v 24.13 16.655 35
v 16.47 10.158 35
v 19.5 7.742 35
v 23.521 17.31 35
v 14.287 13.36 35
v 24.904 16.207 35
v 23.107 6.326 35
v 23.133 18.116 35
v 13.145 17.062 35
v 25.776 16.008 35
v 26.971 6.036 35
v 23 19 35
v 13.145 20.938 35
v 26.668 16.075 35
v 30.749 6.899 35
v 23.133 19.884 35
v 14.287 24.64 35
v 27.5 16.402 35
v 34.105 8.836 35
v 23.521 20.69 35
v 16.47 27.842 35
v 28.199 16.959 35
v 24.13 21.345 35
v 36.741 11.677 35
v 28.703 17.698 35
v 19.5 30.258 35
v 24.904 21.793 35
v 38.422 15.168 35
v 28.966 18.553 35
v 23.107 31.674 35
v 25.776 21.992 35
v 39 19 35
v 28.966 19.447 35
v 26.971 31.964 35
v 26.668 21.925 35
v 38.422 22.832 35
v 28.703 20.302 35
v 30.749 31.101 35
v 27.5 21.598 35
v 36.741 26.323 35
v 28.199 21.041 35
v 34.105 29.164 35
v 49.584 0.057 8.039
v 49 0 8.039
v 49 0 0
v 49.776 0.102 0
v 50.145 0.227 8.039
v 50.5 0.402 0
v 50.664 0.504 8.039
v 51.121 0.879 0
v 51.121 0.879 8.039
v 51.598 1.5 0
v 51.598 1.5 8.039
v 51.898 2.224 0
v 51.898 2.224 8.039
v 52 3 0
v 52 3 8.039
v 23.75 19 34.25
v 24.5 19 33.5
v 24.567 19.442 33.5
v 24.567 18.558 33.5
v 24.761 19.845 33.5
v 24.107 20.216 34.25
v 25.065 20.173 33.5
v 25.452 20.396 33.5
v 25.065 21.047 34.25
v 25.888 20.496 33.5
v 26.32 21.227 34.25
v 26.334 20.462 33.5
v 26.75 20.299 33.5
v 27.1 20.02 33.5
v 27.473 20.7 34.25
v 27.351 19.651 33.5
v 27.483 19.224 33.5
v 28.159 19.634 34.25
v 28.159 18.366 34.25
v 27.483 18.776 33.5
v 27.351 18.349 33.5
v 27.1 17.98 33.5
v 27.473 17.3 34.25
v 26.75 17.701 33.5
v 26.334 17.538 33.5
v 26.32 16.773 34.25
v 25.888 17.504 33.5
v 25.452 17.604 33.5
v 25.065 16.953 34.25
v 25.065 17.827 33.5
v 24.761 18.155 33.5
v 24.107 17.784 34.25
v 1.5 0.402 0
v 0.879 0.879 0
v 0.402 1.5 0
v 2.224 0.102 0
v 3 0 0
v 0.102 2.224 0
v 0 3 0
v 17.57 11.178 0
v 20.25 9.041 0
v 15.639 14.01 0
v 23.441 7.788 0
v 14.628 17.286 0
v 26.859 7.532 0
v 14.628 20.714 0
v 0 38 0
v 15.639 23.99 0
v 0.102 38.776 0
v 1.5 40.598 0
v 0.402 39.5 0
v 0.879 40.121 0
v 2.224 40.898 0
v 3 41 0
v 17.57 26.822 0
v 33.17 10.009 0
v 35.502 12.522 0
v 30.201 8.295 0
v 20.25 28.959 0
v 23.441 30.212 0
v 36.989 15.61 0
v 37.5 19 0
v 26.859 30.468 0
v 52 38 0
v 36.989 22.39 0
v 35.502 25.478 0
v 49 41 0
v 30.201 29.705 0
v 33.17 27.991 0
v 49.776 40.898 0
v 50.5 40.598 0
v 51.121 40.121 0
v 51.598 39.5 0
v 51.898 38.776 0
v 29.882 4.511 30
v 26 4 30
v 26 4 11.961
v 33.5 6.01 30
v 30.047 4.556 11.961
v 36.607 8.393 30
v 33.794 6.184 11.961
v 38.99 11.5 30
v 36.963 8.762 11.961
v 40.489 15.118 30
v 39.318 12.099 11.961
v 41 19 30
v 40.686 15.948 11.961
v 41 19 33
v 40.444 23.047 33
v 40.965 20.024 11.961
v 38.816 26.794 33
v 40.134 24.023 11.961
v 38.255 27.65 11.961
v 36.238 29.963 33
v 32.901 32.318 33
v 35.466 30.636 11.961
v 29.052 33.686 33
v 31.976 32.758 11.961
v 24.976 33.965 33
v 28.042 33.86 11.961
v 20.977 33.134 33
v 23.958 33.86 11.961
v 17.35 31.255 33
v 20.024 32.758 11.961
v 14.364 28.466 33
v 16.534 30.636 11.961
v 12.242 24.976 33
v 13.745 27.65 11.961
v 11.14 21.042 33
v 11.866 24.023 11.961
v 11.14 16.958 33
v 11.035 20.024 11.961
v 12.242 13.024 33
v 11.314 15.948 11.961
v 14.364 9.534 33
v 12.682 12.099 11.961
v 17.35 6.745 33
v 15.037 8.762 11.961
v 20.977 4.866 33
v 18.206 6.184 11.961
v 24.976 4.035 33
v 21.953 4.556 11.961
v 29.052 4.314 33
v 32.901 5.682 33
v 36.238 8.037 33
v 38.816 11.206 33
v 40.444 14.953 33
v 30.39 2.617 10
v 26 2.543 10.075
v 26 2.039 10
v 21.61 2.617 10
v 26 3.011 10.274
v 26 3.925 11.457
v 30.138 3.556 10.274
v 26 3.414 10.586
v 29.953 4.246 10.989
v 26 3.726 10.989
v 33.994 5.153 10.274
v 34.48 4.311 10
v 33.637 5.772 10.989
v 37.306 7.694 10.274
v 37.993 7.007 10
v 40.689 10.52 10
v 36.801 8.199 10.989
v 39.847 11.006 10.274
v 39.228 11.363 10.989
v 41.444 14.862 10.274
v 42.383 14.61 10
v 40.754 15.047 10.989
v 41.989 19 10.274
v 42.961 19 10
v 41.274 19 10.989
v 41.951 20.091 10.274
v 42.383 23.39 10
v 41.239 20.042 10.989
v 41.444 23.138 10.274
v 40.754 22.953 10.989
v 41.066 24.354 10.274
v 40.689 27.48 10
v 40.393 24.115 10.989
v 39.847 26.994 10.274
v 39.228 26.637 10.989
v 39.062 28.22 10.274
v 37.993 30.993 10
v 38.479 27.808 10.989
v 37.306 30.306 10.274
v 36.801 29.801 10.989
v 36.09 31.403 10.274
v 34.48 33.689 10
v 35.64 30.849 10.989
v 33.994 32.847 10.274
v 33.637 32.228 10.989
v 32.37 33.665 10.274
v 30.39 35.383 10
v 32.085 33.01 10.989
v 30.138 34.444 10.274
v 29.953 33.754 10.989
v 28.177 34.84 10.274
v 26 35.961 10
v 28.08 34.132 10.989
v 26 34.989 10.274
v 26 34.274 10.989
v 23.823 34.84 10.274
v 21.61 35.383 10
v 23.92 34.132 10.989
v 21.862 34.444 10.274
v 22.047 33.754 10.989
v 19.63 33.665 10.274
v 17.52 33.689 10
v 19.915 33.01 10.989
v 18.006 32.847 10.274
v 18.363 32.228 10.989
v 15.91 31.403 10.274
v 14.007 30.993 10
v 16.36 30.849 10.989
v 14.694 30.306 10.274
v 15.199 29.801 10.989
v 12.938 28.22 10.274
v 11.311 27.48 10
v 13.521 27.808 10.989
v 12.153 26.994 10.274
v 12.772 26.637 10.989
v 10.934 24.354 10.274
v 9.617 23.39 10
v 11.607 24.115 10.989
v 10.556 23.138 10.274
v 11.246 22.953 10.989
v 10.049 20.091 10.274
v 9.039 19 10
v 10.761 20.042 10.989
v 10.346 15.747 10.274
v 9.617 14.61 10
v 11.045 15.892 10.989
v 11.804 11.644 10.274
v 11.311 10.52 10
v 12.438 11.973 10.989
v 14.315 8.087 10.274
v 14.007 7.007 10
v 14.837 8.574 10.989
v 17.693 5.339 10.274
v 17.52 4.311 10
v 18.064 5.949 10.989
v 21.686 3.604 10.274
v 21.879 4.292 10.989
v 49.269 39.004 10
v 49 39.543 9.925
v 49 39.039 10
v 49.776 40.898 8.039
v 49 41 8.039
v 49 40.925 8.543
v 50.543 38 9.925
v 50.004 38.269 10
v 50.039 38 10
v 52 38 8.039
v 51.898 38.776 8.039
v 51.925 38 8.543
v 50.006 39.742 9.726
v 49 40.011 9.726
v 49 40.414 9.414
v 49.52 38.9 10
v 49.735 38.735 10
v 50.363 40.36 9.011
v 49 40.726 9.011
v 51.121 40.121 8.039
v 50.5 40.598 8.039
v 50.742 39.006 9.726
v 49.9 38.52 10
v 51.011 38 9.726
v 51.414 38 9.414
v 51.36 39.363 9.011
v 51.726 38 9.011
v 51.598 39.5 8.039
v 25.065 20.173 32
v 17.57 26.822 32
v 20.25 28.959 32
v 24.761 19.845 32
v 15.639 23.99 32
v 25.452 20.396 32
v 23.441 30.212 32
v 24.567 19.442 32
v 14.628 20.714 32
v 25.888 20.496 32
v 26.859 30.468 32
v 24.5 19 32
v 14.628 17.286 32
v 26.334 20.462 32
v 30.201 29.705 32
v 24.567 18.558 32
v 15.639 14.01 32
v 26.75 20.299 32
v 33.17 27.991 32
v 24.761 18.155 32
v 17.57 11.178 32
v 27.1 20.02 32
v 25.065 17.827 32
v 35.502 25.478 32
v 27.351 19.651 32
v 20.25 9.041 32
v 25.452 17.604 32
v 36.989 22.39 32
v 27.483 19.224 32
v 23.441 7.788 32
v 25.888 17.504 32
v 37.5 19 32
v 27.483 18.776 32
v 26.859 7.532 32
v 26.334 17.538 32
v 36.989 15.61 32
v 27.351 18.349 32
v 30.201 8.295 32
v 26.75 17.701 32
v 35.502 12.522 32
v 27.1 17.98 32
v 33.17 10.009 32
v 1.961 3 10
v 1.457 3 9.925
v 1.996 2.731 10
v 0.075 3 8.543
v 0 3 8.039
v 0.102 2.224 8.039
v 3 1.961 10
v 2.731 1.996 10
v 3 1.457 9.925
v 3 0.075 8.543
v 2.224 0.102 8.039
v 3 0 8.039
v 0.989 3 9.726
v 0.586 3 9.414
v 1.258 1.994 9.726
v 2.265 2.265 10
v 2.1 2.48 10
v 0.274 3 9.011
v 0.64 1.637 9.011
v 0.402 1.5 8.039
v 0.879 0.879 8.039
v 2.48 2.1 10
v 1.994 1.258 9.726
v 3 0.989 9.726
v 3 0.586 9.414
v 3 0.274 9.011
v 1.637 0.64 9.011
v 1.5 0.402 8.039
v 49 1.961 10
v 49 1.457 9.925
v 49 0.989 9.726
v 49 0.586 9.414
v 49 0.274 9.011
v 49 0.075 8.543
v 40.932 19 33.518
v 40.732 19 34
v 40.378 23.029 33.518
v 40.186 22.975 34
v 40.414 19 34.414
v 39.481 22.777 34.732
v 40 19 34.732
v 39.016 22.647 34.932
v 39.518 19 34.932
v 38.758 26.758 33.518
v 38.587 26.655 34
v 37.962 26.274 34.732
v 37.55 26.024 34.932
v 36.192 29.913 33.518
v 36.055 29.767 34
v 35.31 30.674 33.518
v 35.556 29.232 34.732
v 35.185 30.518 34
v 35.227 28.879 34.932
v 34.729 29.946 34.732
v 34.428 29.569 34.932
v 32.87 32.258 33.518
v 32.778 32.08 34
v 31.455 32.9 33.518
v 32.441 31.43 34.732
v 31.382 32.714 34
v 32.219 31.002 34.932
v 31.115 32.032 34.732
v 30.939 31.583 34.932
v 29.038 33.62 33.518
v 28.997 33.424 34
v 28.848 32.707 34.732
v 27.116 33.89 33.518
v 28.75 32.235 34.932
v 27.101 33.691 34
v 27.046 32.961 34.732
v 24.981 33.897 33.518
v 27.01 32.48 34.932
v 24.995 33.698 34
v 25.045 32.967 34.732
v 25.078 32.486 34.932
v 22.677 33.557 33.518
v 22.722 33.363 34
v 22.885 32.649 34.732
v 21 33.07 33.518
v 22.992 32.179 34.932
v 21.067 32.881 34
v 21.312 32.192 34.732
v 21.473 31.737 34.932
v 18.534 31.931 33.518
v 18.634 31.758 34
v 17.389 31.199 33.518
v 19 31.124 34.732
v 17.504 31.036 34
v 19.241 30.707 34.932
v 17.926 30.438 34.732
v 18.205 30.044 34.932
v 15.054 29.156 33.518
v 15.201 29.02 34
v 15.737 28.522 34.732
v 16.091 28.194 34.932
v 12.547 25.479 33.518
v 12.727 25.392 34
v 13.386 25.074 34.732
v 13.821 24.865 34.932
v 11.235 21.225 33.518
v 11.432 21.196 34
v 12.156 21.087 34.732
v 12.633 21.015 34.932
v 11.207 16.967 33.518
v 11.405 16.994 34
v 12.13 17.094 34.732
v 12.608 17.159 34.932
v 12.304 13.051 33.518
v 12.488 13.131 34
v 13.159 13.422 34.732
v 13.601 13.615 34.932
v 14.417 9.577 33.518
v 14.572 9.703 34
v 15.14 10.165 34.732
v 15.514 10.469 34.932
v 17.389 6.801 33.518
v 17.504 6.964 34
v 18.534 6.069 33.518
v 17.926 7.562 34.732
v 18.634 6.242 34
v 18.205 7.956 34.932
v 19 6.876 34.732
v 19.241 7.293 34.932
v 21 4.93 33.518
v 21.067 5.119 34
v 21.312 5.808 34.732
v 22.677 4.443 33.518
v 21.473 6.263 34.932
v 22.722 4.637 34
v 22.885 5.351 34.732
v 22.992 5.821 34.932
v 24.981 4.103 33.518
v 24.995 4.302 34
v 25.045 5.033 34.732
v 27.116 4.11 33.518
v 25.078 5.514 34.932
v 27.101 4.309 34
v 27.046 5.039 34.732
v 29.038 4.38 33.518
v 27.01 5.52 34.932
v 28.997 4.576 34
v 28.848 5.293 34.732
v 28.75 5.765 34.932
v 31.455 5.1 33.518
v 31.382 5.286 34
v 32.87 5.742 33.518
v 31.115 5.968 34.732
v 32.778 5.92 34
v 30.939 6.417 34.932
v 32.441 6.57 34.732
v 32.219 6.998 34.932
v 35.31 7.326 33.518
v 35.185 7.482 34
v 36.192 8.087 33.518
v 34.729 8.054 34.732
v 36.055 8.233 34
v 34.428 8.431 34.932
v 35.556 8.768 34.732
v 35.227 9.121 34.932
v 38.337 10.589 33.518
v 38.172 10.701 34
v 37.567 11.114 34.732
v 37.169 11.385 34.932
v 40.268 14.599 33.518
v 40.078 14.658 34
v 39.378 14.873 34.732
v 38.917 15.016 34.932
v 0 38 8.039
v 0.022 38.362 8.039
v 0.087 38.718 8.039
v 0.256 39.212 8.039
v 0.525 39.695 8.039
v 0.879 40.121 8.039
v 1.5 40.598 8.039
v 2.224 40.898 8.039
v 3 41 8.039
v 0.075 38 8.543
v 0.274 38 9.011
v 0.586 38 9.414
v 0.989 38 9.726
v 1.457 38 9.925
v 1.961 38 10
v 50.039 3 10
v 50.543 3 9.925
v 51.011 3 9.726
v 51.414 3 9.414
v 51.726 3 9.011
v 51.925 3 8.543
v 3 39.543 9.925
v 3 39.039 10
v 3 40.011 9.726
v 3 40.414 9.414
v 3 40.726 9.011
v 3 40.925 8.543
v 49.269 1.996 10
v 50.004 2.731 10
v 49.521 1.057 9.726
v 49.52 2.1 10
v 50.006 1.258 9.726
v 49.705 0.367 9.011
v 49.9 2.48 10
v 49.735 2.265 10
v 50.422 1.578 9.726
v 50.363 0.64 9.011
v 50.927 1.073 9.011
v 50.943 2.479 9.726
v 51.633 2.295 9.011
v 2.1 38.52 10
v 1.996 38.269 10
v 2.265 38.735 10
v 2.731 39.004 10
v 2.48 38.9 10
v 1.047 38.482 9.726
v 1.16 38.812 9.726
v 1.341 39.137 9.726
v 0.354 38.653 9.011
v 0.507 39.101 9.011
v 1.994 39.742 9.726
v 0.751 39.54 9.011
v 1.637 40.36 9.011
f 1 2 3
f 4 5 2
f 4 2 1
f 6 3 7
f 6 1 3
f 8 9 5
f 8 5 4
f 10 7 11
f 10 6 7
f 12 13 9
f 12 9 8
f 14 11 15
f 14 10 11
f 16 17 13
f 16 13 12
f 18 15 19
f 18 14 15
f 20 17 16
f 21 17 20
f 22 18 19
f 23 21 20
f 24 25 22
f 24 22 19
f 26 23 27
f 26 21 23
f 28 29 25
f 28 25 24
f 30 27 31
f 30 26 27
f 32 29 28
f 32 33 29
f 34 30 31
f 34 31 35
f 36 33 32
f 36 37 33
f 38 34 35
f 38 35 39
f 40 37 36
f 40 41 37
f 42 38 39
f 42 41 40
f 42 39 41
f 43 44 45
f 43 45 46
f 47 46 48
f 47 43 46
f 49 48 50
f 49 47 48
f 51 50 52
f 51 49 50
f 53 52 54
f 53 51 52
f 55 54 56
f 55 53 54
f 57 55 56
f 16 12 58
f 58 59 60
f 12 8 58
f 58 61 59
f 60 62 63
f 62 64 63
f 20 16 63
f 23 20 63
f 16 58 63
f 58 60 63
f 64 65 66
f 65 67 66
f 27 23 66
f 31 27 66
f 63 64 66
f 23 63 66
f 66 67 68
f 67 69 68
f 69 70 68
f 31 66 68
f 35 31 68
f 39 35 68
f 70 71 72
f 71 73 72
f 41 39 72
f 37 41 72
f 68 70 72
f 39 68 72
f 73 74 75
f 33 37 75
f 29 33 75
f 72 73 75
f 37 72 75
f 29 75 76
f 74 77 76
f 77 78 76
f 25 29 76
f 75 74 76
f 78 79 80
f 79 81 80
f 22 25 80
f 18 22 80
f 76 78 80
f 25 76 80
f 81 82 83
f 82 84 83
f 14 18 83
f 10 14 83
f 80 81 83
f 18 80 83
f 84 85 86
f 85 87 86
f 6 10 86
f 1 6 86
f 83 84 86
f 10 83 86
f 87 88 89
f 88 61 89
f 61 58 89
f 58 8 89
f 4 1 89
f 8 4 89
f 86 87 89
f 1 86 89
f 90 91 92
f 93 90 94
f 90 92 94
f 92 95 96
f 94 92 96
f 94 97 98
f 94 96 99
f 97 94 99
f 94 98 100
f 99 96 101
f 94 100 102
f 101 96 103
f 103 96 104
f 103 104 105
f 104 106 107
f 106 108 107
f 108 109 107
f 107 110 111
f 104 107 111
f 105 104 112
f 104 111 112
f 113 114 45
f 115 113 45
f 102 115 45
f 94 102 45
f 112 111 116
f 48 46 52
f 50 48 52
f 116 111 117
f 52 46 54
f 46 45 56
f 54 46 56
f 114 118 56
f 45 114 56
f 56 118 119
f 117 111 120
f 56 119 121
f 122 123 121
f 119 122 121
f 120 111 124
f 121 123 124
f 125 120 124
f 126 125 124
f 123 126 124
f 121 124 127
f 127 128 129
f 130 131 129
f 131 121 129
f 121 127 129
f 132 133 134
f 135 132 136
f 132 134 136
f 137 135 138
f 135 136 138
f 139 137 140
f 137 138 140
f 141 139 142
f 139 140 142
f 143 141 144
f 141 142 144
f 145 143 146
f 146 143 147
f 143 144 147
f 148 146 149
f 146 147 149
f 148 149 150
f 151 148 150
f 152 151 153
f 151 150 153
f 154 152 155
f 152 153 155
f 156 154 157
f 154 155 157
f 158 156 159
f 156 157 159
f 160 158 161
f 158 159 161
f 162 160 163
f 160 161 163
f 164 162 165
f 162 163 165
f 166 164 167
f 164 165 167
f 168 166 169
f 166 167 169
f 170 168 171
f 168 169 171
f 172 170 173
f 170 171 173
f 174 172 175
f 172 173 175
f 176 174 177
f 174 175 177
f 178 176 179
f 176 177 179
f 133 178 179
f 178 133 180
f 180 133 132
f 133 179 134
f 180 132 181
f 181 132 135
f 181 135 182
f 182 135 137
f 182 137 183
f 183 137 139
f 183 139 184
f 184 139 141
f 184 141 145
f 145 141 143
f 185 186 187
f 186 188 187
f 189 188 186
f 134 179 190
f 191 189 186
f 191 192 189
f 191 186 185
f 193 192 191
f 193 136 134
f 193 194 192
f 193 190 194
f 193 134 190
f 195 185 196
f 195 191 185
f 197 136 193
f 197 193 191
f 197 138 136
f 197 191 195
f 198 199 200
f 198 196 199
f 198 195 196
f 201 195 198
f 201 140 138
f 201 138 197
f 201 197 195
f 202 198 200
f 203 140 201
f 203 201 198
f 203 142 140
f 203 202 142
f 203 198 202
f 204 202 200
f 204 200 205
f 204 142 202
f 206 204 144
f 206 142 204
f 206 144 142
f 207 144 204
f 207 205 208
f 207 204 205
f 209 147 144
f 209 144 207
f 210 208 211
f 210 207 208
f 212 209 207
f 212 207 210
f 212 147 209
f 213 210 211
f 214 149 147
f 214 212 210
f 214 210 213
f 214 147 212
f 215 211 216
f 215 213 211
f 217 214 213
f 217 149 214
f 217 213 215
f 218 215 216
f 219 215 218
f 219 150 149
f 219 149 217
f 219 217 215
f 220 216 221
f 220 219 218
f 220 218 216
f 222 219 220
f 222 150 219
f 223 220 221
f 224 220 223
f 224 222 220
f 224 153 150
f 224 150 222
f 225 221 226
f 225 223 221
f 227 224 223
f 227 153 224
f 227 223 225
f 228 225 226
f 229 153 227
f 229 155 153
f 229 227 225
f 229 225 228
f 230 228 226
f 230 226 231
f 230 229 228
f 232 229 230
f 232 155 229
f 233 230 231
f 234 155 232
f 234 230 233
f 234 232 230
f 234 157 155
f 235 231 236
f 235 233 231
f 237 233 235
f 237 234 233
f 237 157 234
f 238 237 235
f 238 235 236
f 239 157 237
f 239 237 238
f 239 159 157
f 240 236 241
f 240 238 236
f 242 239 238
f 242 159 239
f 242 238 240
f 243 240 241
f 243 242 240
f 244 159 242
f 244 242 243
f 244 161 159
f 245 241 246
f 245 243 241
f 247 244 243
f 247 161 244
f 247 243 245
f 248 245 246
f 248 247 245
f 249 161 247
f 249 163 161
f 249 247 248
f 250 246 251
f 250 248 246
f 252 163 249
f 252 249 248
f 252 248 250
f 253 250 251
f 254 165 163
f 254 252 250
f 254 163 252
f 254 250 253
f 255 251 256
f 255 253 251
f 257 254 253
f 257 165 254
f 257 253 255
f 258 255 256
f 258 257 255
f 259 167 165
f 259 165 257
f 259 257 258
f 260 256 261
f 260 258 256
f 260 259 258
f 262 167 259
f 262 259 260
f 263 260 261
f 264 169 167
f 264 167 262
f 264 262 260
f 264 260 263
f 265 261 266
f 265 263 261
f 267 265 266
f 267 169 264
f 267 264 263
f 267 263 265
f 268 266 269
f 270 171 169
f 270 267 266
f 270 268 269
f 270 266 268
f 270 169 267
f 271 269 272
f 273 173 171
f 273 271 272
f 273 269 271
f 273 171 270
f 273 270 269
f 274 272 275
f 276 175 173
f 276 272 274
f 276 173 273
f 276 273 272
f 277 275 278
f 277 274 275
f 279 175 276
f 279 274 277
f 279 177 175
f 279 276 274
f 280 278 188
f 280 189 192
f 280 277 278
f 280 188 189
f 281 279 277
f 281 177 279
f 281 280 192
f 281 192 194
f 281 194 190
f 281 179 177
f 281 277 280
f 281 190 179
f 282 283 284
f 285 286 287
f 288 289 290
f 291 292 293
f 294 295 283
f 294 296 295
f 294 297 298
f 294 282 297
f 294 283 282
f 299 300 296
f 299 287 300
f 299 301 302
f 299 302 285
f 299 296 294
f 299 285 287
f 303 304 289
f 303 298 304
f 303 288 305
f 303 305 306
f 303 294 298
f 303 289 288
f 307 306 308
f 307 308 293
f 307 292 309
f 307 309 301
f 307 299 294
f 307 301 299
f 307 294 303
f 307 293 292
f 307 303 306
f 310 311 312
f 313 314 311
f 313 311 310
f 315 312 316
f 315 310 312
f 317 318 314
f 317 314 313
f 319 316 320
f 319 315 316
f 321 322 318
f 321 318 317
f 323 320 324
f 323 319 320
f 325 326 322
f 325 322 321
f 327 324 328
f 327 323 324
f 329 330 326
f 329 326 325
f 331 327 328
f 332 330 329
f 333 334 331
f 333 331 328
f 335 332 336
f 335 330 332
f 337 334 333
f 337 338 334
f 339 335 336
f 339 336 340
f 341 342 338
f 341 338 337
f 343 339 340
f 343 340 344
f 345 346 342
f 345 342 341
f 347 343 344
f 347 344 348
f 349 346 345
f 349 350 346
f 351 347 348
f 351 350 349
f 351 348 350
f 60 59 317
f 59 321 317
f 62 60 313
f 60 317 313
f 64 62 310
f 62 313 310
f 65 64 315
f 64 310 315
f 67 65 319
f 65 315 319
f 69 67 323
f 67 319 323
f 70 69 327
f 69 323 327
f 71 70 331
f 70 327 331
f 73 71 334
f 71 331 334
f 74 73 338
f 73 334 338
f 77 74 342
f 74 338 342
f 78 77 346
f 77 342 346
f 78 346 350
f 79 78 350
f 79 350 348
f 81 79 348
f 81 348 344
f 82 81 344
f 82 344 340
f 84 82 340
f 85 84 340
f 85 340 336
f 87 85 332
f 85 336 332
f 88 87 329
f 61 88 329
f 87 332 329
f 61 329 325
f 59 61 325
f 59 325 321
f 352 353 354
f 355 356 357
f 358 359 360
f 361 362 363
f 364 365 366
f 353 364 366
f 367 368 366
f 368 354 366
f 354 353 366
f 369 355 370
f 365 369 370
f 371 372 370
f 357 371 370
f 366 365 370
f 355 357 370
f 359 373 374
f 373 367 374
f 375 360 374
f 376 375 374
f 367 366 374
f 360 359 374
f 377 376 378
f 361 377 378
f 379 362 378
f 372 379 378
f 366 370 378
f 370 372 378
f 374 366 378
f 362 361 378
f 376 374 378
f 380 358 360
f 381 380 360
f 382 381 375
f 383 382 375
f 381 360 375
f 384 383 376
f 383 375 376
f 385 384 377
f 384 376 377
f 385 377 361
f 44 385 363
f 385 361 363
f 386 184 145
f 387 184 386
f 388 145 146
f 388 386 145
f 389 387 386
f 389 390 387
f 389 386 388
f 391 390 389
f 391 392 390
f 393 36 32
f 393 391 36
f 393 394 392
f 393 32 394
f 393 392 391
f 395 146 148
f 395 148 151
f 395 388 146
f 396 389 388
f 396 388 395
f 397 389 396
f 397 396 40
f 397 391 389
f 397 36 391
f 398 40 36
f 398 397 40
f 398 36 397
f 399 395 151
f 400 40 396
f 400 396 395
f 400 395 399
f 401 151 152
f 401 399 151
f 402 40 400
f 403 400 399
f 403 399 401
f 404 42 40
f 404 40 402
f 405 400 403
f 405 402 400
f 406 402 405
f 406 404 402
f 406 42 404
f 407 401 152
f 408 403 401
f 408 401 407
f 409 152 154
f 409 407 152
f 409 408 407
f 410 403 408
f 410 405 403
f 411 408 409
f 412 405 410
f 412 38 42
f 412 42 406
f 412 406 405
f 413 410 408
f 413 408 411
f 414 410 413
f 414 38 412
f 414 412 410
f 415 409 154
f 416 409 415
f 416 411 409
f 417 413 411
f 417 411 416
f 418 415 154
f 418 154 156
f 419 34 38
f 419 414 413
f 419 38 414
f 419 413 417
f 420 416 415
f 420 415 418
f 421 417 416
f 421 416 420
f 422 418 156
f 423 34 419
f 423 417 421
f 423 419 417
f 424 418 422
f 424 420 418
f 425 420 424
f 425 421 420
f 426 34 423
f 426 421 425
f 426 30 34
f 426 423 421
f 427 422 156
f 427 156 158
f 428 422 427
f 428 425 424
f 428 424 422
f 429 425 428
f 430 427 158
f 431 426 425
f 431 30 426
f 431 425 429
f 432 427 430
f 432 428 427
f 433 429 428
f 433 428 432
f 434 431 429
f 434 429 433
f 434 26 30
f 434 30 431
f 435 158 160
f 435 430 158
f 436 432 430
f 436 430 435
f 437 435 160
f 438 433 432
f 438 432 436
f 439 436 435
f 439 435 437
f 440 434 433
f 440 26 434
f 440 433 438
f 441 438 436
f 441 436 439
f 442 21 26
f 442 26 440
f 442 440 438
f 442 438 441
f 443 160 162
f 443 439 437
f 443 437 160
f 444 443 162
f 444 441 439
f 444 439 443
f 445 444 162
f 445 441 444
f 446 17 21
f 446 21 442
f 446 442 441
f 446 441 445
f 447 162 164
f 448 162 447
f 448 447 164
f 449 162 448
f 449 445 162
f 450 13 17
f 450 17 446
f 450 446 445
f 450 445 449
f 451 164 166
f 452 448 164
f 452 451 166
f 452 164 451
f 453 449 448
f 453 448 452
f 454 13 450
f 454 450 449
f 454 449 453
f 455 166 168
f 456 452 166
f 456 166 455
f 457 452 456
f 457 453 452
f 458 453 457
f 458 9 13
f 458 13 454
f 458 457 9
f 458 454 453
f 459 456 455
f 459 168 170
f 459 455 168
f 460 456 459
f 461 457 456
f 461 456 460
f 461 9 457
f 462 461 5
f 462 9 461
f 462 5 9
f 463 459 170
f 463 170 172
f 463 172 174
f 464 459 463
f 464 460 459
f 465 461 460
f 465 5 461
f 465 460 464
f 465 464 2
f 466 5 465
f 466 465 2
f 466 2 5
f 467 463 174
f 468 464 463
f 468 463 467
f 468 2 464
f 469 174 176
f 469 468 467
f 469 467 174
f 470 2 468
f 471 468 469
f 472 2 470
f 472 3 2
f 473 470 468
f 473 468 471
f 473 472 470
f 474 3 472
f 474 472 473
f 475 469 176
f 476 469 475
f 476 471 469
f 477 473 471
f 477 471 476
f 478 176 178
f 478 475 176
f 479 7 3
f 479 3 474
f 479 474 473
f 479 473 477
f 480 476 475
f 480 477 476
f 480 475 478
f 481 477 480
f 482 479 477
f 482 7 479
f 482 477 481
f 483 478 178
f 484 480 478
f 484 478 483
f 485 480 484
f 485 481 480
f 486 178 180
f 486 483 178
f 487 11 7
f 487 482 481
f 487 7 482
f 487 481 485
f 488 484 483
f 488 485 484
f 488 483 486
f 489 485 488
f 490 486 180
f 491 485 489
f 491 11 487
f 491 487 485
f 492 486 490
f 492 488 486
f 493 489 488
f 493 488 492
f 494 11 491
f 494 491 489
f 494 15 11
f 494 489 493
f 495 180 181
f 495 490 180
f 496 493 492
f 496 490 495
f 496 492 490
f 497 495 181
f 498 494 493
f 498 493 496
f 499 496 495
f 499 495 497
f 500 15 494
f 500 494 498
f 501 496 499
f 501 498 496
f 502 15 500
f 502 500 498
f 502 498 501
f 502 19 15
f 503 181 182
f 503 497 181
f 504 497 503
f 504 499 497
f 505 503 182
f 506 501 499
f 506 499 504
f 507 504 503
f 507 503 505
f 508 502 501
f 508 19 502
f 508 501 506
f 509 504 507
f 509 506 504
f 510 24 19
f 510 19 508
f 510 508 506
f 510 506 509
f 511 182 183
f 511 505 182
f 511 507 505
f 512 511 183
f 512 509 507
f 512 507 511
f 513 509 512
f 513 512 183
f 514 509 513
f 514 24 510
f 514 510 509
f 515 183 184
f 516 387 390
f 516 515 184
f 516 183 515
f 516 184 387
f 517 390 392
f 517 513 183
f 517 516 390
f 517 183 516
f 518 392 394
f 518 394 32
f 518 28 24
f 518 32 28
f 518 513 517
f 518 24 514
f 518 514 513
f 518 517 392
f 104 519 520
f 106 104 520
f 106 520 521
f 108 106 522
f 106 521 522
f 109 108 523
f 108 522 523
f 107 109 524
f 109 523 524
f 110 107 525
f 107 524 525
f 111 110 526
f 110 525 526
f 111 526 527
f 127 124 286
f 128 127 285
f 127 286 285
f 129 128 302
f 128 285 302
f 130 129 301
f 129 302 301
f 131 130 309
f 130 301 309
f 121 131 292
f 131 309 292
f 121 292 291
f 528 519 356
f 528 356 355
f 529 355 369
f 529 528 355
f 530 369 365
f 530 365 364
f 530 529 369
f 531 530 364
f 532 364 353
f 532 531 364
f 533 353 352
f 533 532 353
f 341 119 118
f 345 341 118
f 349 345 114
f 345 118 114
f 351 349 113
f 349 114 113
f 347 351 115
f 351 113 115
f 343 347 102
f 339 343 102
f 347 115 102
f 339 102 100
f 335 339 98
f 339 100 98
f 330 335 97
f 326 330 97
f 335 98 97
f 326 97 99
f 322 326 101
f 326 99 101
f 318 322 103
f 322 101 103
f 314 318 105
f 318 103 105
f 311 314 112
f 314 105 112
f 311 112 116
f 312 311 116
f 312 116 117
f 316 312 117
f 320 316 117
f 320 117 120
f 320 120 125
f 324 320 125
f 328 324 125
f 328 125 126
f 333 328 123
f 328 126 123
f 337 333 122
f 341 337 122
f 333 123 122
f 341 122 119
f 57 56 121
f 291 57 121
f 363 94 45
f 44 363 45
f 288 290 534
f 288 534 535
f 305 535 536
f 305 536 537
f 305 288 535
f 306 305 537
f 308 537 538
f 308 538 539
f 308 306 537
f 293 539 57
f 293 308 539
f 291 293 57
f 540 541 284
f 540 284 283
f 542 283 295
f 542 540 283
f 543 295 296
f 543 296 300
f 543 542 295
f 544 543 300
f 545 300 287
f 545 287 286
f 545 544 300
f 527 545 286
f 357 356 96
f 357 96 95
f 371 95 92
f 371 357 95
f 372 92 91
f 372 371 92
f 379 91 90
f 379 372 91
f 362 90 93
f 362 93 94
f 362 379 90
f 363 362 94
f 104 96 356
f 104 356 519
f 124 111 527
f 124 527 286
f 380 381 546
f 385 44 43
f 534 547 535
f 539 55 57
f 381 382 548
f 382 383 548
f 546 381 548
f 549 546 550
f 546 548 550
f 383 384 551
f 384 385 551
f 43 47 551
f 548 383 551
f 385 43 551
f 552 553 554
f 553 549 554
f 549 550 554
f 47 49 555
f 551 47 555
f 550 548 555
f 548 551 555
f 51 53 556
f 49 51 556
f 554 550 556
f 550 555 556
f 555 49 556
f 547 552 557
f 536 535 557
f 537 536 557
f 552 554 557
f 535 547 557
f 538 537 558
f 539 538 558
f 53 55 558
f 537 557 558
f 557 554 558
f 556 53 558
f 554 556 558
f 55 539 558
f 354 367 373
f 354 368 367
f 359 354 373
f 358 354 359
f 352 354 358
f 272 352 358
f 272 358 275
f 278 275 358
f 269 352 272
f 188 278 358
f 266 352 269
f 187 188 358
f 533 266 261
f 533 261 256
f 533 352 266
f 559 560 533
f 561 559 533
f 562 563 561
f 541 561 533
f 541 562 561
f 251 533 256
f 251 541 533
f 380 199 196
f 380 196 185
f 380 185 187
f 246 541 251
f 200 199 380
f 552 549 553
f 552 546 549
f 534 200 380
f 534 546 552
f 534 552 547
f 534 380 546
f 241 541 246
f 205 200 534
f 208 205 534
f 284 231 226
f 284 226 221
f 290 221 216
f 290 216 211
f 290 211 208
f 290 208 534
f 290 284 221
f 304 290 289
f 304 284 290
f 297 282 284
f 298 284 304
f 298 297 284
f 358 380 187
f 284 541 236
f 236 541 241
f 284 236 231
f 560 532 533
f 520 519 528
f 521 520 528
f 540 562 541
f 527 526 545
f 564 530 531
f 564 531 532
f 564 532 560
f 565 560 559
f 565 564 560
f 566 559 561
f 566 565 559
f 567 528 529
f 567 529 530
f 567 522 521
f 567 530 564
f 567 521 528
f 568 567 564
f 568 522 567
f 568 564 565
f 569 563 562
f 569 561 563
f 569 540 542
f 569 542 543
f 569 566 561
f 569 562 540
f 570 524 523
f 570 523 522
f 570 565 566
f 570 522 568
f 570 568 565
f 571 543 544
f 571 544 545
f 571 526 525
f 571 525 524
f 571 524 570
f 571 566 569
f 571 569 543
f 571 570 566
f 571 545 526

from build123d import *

# Parameters (mm, degrees)
F0_W            = 52
F0_H            = 41
F1_DEPTH        = 10
F3_DEPTH        = 20
F4_R            = 11
F5_DEPTH        = 10.001
F6_R            = 15
F7_DEPTH        = 5
F9_R            = 3
F10_R           = 11.5
F10_R_2         = 9.5
F11_DEPTH       = 35
F12_T3_DEPTH    = 35
F12_T5_DEPTH    = 46
F12_T8_ANGLE    = 90
F12_T10_ANGLE   = 90
F12_T12_ANGLE   = 90
F12_T14_ANGLE   = 90
F13_R           = 10
F14_DEPTH       = 32
F15_R           = 11.5
F16_DEPTH       = 32
F18_D           = 3
F18_CSINK_D     = 6
F18_CSINK_ANGLE = 90


# Not quite as in the source:
# - a fillet or chamfer that OpenCascade refuses, or shapes differently, is made with other operations: its cross-section is extruded or revolved along the edge and cut away or added


with BuildPart() as f1:
    # F0 (on Top) → F1 (new body)
    with BuildSketch(Plane.XY):
        with Locations((26, 20.5)):
            Rectangle(F0_W, F0_H)
    extrude(amount=F1_DEPTH)

    # F2 (on face) → F3 (join)
    with BuildSketch(Plane.XY.offset(10)):
        with BuildLine():
            ThreePointArc((41, 19), (15.3933982822, 29.6066017178), (26, 4))
            ThreePointArc((26, 4), (36.6066017178, 8.3933982822), (41, 19))
        make_face()
        with BuildLine():
            ThreePointArc((37, 19), (33.7781745931, 11.2218254069), (26, 8))
            ThreePointArc((26, 8), (18.2218254069, 26.7781745931), (37, 19))
        make_face(mode=Mode.SUBTRACT)
    extrude(amount=F3_DEPTH)

    # F4 (on face) → F5 (cut, through all)
    with BuildSketch(Plane.XY.offset(10)):
        with Locations((26, 19)):
            Circle(F4_R)
    extrude(amount=-F5_DEPTH, mode=Mode.SUBTRACT)

    # F6 (on face) → F7 (join)
    with BuildSketch(Plane.XY.offset(30)):
        with Locations((26, 19)):
            Circle(F6_R)
    extrude(amount=F7_DEPTH)

    # F8: fillet of radius 2 on 1 edges, made by hand

    # F8_s1 → F8_t2 (revolve, cut)
    with BuildSketch(Plane.XZ.offset(-19)):
        with BuildLine():
            ThreePointArc((41, 33), (40.4142135624, 34.4142135624), (39, 35))
            Line((39, 35), (41, 35))
            Line((41, 35), (41, 33))
        make_face()
    revolve(axis=Axis((26, 19, 35), (0, 0, 1)), mode=Mode.SUBTRACT)

    # F9
    f9_edges = [f1.edges().sort_by_distance(p)[0] for p in [
        (52, 0, 5),
        (0, 0, 5),
        (0, 41, 5),
        (52, 41, 5),
    ]]
    fillet(f9_edges, radius=F9_R)

    # F10 (on face) → F11 (join)
    with BuildSketch(Plane(origin=(0, 0, 0), x_dir=(1, 0, 0), z_dir=(0, 0, -1))):
        with Locations((26, -19)):
            Circle(F10_R)
        with Locations((26, -19)):
            Circle(F10_R_2, mode=Mode.SUBTRACT)
    extrude(amount=-F11_DEPTH)

    # F12: fillet of radius 2 on 9 edges, made by hand

    # F12_s1 → F12_t2 (revolve)
    with BuildSketch(Plane.YZ.offset(26)):
        with BuildLine():
            ThreePointArc((1.9990343146, 9.9996), (3.4142135624, 10.5857864376), (4.0004, 12.0009656854))
            Line((4.0004, 12.0009656854), (4.2005365685, 12.0009656854))
            ThreePointArc((4.2005365685, 12.0009656854), (4.2001365685, 11.0004828427), (4.2001365685, 10))
            Line((4.2001365685, 10), (4, 9.7998634315))
            ThreePointArc((4, 9.7998634315), (2.9995171573, 9.7998634315), (1.9990343146, 9.7994634315))
            Line((1.9990343146, 9.7994634315), (1.9990343146, 9.9996))
        make_face()
    revolve(axis=Axis((26, 19, 10), (0, 0, 1)))

    # F12_s4 → F12_t3 (cut)
    with BuildSketch(Plane.XZ.offset(-38)):
        with BuildLine():
            ThreePointArc((-0.0004, 7.9990343146), (0.5857864376, 9.4142135624), (2.0009656854, 10.0004))
            Line((2.0009656854, 10.0004), (2.0009656854, 10.2005365685))
            ThreePointArc((2.0009656854, 10.2005365685), (1.0004828427, 10.2001365685), (0, 10.2001365685))
            Line((0, 10.2001365685), (-0.2001365685, 10))
            ThreePointArc((-0.2001365685, 10), (-0.2001365685, 8.9995171573), (-0.2005365685, 7.9990343146))
            Line((-0.2005365685, 7.9990343146), (-0.0004, 7.9990343146))
        make_face()
        with BuildLine():
            ThreePointArc((49.9990343146, 10.0004), (51.4142135624, 9.4142135624), (52.0004, 7.9990343146))
            Line((52.0004, 7.9990343146), (52.2005365685, 7.9990343146))
            ThreePointArc((52.2005365685, 7.9990343146), (52.2001365685, 8.9995171573), (52.2001365685, 10))
            Line((52.2001365685, 10), (52, 10.2001365685))
            ThreePointArc((52, 10.2001365685), (50.9995171573, 10.2001365685), (49.9990343146, 10.2005365685))
            Line((49.9990343146, 10.2005365685), (49.9990343146, 10.0004))
        make_face()
    extrude(amount=F12_T3_DEPTH, mode=Mode.SUBTRACT)

    # F12_s6 → F12_t5 (cut)
    with BuildSketch(Plane.YZ.offset(3)):
        with BuildLine():
            ThreePointArc((38.9990343146, 10.0004), (40.4142135624, 9.4142135624), (41.0004, 7.9990343146))
            Line((41.0004, 7.9990343146), (41.2005365685, 7.9990343146))
            ThreePointArc((41.2005365685, 7.9990343146), (41.2001365685, 8.9995171573), (41.2001365685, 10))
            Line((41.2001365685, 10), (41, 10.2001365685))
            ThreePointArc((41, 10.2001365685), (39.9995171573, 10.2001365685), (38.9990343146, 10.2005365685))
            Line((38.9990343146, 10.2005365685), (38.9990343146, 10.0004))
        make_face()
        with BuildLine():
            ThreePointArc((2.0009656854, 10.0004), (0.5857864376, 9.4142135624), (-0.0004, 7.9990343146))
            Line((-0.0004, 7.9990343146), (-0.2005365685, 7.9990343146))
            ThreePointArc((-0.2005365685, 7.9990343146), (-0.2001365685, 8.9995171573), (-0.2001365685, 10))
            Line((-0.2001365685, 10), (0, 10.2001365685))
            ThreePointArc((0, 10.2001365685), (1.0004828427, 10.2001365685), (2.0009656854, 10.2005365685))
            Line((2.0009656854, 10.2005365685), (2.0009656854, 10.0004))
        make_face()
    extrude(amount=F12_T5_DEPTH, mode=Mode.SUBTRACT)

    # F12_s7 → F12_t8 (revolve, cut)
    with BuildSketch(Plane.XZ.offset(-38)):
        with BuildLine():
            ThreePointArc((2.0009656854, 10.0004), (0.5857864376, 9.4142135624), (-0.0004, 7.9990343146))
            Line((-0.0004, 7.9990343146), (-0.2005365685, 7.9990343146))
            ThreePointArc((-0.2005365685, 7.9990343146), (-0.2001365685, 8.9995171573), (-0.2001365685, 10))
            Line((-0.2001365685, 10), (0, 10.2001365685))
            ThreePointArc((0, 10.2001365685), (1.0004828427, 10.2001365685), (2.0009656854, 10.2005365685))
            Line((2.0009656854, 10.2005365685), (2.0009656854, 10.0004))
        make_face()
    revolve(axis=Axis((3, 38, 10), (0, 0, -1)), revolution_arc=F12_T8_ANGLE, mode=Mode.SUBTRACT)

    # F12_s9 → F12_t10 (revolve, cut)
    with BuildSketch(Plane.XZ.offset(-3)):
        with BuildLine():
            ThreePointArc((2.0009656854, 10.0004), (0.5857864376, 9.4142135624), (-0.0004, 7.9990343146))
            Line((-0.0004, 7.9990343146), (-0.2005365685, 7.9990343146))
            ThreePointArc((-0.2005365685, 7.9990343146), (-0.2001365685, 8.9995171573), (-0.2001365685, 10))
            Line((-0.2001365685, 10), (0, 10.2001365685))
            ThreePointArc((0, 10.2001365685), (1.0004828427, 10.2001365685), (2.0009656854, 10.2005365685))
            Line((2.0009656854, 10.2005365685), (2.0009656854, 10.0004))
        make_face()
    revolve(axis=Axis((3, 3, 10), (0, 0, 1)), revolution_arc=F12_T10_ANGLE, mode=Mode.SUBTRACT)

    # F12_s11 → F12_t12 (revolve, cut)
    with BuildSketch(Plane.YZ.offset(49)):
        with BuildLine():
            ThreePointArc((38.9990343146, 10.0004), (40.4142135624, 9.4142135624), (41.0004, 7.9990343146))
            Line((41.0004, 7.9990343146), (41.2005365685, 7.9990343146))
            ThreePointArc((41.2005365685, 7.9990343146), (41.2001365685, 8.9995171573), (41.2001365685, 10))
            Line((41.2001365685, 10), (41, 10.2001365685))
            ThreePointArc((41, 10.2001365685), (39.9995171573, 10.2001365685), (38.9990343146, 10.2005365685))
            Line((38.9990343146, 10.2005365685), (38.9990343146, 10.0004))
        make_face()
    revolve(axis=Axis((49, 38, 10), (0, 0, -1)), revolution_arc=F12_T12_ANGLE, mode=Mode.SUBTRACT)

    # F12_s13 → F12_t14 (revolve, cut)
    with BuildSketch(Plane.YZ.offset(49)):
        with BuildLine():
            ThreePointArc((2.0009656854, 10.0004), (0.5857864376, 9.4142135624), (-0.0004, 7.9990343146))
            Line((-0.0004, 7.9990343146), (-0.2005365685, 7.9990343146))
            ThreePointArc((-0.2005365685, 7.9990343146), (-0.2001365685, 8.9995171573), (-0.2001365685, 10))
            Line((-0.2001365685, 10), (0, 10.2001365685))
            ThreePointArc((0, 10.2001365685), (1.0004828427, 10.2001365685), (2.0009656854, 10.2005365685))
            Line((2.0009656854, 10.2005365685), (2.0009656854, 10.0004))
        make_face()
    revolve(axis=Axis((49, 3, 10), (0, 0, 1)), revolution_arc=F12_T14_ANGLE, mode=Mode.SUBTRACT)

    # F13 (on face) → F14 (cut)
    with BuildSketch(Plane(origin=(0, 0, 0), x_dir=(1, 0, 0), z_dir=(0, 0, -1))):
        with Locations((26, -19)):
            Circle(F13_R)
    extrude(amount=-F14_DEPTH, mode=Mode.SUBTRACT)

    # F15 (on face) → F16 (cut, through all)
    with BuildSketch(Plane(origin=(0, 0, 0), x_dir=(1, 0, 0), z_dir=(0, 0, -1))):
        with Locations((26, -19)):
            Circle(F15_R)
    extrude(amount=-F16_DEPTH, mode=Mode.SUBTRACT)

    # F18 (through all)
    with Locations(Plane.XY.offset(35)):
        with Locations((26, 19)):
            CounterSinkHole(F18_D / 2, F18_CSINK_D / 2, counter_sink_angle=F18_CSINK_ANGLE)


solid = f1.part
